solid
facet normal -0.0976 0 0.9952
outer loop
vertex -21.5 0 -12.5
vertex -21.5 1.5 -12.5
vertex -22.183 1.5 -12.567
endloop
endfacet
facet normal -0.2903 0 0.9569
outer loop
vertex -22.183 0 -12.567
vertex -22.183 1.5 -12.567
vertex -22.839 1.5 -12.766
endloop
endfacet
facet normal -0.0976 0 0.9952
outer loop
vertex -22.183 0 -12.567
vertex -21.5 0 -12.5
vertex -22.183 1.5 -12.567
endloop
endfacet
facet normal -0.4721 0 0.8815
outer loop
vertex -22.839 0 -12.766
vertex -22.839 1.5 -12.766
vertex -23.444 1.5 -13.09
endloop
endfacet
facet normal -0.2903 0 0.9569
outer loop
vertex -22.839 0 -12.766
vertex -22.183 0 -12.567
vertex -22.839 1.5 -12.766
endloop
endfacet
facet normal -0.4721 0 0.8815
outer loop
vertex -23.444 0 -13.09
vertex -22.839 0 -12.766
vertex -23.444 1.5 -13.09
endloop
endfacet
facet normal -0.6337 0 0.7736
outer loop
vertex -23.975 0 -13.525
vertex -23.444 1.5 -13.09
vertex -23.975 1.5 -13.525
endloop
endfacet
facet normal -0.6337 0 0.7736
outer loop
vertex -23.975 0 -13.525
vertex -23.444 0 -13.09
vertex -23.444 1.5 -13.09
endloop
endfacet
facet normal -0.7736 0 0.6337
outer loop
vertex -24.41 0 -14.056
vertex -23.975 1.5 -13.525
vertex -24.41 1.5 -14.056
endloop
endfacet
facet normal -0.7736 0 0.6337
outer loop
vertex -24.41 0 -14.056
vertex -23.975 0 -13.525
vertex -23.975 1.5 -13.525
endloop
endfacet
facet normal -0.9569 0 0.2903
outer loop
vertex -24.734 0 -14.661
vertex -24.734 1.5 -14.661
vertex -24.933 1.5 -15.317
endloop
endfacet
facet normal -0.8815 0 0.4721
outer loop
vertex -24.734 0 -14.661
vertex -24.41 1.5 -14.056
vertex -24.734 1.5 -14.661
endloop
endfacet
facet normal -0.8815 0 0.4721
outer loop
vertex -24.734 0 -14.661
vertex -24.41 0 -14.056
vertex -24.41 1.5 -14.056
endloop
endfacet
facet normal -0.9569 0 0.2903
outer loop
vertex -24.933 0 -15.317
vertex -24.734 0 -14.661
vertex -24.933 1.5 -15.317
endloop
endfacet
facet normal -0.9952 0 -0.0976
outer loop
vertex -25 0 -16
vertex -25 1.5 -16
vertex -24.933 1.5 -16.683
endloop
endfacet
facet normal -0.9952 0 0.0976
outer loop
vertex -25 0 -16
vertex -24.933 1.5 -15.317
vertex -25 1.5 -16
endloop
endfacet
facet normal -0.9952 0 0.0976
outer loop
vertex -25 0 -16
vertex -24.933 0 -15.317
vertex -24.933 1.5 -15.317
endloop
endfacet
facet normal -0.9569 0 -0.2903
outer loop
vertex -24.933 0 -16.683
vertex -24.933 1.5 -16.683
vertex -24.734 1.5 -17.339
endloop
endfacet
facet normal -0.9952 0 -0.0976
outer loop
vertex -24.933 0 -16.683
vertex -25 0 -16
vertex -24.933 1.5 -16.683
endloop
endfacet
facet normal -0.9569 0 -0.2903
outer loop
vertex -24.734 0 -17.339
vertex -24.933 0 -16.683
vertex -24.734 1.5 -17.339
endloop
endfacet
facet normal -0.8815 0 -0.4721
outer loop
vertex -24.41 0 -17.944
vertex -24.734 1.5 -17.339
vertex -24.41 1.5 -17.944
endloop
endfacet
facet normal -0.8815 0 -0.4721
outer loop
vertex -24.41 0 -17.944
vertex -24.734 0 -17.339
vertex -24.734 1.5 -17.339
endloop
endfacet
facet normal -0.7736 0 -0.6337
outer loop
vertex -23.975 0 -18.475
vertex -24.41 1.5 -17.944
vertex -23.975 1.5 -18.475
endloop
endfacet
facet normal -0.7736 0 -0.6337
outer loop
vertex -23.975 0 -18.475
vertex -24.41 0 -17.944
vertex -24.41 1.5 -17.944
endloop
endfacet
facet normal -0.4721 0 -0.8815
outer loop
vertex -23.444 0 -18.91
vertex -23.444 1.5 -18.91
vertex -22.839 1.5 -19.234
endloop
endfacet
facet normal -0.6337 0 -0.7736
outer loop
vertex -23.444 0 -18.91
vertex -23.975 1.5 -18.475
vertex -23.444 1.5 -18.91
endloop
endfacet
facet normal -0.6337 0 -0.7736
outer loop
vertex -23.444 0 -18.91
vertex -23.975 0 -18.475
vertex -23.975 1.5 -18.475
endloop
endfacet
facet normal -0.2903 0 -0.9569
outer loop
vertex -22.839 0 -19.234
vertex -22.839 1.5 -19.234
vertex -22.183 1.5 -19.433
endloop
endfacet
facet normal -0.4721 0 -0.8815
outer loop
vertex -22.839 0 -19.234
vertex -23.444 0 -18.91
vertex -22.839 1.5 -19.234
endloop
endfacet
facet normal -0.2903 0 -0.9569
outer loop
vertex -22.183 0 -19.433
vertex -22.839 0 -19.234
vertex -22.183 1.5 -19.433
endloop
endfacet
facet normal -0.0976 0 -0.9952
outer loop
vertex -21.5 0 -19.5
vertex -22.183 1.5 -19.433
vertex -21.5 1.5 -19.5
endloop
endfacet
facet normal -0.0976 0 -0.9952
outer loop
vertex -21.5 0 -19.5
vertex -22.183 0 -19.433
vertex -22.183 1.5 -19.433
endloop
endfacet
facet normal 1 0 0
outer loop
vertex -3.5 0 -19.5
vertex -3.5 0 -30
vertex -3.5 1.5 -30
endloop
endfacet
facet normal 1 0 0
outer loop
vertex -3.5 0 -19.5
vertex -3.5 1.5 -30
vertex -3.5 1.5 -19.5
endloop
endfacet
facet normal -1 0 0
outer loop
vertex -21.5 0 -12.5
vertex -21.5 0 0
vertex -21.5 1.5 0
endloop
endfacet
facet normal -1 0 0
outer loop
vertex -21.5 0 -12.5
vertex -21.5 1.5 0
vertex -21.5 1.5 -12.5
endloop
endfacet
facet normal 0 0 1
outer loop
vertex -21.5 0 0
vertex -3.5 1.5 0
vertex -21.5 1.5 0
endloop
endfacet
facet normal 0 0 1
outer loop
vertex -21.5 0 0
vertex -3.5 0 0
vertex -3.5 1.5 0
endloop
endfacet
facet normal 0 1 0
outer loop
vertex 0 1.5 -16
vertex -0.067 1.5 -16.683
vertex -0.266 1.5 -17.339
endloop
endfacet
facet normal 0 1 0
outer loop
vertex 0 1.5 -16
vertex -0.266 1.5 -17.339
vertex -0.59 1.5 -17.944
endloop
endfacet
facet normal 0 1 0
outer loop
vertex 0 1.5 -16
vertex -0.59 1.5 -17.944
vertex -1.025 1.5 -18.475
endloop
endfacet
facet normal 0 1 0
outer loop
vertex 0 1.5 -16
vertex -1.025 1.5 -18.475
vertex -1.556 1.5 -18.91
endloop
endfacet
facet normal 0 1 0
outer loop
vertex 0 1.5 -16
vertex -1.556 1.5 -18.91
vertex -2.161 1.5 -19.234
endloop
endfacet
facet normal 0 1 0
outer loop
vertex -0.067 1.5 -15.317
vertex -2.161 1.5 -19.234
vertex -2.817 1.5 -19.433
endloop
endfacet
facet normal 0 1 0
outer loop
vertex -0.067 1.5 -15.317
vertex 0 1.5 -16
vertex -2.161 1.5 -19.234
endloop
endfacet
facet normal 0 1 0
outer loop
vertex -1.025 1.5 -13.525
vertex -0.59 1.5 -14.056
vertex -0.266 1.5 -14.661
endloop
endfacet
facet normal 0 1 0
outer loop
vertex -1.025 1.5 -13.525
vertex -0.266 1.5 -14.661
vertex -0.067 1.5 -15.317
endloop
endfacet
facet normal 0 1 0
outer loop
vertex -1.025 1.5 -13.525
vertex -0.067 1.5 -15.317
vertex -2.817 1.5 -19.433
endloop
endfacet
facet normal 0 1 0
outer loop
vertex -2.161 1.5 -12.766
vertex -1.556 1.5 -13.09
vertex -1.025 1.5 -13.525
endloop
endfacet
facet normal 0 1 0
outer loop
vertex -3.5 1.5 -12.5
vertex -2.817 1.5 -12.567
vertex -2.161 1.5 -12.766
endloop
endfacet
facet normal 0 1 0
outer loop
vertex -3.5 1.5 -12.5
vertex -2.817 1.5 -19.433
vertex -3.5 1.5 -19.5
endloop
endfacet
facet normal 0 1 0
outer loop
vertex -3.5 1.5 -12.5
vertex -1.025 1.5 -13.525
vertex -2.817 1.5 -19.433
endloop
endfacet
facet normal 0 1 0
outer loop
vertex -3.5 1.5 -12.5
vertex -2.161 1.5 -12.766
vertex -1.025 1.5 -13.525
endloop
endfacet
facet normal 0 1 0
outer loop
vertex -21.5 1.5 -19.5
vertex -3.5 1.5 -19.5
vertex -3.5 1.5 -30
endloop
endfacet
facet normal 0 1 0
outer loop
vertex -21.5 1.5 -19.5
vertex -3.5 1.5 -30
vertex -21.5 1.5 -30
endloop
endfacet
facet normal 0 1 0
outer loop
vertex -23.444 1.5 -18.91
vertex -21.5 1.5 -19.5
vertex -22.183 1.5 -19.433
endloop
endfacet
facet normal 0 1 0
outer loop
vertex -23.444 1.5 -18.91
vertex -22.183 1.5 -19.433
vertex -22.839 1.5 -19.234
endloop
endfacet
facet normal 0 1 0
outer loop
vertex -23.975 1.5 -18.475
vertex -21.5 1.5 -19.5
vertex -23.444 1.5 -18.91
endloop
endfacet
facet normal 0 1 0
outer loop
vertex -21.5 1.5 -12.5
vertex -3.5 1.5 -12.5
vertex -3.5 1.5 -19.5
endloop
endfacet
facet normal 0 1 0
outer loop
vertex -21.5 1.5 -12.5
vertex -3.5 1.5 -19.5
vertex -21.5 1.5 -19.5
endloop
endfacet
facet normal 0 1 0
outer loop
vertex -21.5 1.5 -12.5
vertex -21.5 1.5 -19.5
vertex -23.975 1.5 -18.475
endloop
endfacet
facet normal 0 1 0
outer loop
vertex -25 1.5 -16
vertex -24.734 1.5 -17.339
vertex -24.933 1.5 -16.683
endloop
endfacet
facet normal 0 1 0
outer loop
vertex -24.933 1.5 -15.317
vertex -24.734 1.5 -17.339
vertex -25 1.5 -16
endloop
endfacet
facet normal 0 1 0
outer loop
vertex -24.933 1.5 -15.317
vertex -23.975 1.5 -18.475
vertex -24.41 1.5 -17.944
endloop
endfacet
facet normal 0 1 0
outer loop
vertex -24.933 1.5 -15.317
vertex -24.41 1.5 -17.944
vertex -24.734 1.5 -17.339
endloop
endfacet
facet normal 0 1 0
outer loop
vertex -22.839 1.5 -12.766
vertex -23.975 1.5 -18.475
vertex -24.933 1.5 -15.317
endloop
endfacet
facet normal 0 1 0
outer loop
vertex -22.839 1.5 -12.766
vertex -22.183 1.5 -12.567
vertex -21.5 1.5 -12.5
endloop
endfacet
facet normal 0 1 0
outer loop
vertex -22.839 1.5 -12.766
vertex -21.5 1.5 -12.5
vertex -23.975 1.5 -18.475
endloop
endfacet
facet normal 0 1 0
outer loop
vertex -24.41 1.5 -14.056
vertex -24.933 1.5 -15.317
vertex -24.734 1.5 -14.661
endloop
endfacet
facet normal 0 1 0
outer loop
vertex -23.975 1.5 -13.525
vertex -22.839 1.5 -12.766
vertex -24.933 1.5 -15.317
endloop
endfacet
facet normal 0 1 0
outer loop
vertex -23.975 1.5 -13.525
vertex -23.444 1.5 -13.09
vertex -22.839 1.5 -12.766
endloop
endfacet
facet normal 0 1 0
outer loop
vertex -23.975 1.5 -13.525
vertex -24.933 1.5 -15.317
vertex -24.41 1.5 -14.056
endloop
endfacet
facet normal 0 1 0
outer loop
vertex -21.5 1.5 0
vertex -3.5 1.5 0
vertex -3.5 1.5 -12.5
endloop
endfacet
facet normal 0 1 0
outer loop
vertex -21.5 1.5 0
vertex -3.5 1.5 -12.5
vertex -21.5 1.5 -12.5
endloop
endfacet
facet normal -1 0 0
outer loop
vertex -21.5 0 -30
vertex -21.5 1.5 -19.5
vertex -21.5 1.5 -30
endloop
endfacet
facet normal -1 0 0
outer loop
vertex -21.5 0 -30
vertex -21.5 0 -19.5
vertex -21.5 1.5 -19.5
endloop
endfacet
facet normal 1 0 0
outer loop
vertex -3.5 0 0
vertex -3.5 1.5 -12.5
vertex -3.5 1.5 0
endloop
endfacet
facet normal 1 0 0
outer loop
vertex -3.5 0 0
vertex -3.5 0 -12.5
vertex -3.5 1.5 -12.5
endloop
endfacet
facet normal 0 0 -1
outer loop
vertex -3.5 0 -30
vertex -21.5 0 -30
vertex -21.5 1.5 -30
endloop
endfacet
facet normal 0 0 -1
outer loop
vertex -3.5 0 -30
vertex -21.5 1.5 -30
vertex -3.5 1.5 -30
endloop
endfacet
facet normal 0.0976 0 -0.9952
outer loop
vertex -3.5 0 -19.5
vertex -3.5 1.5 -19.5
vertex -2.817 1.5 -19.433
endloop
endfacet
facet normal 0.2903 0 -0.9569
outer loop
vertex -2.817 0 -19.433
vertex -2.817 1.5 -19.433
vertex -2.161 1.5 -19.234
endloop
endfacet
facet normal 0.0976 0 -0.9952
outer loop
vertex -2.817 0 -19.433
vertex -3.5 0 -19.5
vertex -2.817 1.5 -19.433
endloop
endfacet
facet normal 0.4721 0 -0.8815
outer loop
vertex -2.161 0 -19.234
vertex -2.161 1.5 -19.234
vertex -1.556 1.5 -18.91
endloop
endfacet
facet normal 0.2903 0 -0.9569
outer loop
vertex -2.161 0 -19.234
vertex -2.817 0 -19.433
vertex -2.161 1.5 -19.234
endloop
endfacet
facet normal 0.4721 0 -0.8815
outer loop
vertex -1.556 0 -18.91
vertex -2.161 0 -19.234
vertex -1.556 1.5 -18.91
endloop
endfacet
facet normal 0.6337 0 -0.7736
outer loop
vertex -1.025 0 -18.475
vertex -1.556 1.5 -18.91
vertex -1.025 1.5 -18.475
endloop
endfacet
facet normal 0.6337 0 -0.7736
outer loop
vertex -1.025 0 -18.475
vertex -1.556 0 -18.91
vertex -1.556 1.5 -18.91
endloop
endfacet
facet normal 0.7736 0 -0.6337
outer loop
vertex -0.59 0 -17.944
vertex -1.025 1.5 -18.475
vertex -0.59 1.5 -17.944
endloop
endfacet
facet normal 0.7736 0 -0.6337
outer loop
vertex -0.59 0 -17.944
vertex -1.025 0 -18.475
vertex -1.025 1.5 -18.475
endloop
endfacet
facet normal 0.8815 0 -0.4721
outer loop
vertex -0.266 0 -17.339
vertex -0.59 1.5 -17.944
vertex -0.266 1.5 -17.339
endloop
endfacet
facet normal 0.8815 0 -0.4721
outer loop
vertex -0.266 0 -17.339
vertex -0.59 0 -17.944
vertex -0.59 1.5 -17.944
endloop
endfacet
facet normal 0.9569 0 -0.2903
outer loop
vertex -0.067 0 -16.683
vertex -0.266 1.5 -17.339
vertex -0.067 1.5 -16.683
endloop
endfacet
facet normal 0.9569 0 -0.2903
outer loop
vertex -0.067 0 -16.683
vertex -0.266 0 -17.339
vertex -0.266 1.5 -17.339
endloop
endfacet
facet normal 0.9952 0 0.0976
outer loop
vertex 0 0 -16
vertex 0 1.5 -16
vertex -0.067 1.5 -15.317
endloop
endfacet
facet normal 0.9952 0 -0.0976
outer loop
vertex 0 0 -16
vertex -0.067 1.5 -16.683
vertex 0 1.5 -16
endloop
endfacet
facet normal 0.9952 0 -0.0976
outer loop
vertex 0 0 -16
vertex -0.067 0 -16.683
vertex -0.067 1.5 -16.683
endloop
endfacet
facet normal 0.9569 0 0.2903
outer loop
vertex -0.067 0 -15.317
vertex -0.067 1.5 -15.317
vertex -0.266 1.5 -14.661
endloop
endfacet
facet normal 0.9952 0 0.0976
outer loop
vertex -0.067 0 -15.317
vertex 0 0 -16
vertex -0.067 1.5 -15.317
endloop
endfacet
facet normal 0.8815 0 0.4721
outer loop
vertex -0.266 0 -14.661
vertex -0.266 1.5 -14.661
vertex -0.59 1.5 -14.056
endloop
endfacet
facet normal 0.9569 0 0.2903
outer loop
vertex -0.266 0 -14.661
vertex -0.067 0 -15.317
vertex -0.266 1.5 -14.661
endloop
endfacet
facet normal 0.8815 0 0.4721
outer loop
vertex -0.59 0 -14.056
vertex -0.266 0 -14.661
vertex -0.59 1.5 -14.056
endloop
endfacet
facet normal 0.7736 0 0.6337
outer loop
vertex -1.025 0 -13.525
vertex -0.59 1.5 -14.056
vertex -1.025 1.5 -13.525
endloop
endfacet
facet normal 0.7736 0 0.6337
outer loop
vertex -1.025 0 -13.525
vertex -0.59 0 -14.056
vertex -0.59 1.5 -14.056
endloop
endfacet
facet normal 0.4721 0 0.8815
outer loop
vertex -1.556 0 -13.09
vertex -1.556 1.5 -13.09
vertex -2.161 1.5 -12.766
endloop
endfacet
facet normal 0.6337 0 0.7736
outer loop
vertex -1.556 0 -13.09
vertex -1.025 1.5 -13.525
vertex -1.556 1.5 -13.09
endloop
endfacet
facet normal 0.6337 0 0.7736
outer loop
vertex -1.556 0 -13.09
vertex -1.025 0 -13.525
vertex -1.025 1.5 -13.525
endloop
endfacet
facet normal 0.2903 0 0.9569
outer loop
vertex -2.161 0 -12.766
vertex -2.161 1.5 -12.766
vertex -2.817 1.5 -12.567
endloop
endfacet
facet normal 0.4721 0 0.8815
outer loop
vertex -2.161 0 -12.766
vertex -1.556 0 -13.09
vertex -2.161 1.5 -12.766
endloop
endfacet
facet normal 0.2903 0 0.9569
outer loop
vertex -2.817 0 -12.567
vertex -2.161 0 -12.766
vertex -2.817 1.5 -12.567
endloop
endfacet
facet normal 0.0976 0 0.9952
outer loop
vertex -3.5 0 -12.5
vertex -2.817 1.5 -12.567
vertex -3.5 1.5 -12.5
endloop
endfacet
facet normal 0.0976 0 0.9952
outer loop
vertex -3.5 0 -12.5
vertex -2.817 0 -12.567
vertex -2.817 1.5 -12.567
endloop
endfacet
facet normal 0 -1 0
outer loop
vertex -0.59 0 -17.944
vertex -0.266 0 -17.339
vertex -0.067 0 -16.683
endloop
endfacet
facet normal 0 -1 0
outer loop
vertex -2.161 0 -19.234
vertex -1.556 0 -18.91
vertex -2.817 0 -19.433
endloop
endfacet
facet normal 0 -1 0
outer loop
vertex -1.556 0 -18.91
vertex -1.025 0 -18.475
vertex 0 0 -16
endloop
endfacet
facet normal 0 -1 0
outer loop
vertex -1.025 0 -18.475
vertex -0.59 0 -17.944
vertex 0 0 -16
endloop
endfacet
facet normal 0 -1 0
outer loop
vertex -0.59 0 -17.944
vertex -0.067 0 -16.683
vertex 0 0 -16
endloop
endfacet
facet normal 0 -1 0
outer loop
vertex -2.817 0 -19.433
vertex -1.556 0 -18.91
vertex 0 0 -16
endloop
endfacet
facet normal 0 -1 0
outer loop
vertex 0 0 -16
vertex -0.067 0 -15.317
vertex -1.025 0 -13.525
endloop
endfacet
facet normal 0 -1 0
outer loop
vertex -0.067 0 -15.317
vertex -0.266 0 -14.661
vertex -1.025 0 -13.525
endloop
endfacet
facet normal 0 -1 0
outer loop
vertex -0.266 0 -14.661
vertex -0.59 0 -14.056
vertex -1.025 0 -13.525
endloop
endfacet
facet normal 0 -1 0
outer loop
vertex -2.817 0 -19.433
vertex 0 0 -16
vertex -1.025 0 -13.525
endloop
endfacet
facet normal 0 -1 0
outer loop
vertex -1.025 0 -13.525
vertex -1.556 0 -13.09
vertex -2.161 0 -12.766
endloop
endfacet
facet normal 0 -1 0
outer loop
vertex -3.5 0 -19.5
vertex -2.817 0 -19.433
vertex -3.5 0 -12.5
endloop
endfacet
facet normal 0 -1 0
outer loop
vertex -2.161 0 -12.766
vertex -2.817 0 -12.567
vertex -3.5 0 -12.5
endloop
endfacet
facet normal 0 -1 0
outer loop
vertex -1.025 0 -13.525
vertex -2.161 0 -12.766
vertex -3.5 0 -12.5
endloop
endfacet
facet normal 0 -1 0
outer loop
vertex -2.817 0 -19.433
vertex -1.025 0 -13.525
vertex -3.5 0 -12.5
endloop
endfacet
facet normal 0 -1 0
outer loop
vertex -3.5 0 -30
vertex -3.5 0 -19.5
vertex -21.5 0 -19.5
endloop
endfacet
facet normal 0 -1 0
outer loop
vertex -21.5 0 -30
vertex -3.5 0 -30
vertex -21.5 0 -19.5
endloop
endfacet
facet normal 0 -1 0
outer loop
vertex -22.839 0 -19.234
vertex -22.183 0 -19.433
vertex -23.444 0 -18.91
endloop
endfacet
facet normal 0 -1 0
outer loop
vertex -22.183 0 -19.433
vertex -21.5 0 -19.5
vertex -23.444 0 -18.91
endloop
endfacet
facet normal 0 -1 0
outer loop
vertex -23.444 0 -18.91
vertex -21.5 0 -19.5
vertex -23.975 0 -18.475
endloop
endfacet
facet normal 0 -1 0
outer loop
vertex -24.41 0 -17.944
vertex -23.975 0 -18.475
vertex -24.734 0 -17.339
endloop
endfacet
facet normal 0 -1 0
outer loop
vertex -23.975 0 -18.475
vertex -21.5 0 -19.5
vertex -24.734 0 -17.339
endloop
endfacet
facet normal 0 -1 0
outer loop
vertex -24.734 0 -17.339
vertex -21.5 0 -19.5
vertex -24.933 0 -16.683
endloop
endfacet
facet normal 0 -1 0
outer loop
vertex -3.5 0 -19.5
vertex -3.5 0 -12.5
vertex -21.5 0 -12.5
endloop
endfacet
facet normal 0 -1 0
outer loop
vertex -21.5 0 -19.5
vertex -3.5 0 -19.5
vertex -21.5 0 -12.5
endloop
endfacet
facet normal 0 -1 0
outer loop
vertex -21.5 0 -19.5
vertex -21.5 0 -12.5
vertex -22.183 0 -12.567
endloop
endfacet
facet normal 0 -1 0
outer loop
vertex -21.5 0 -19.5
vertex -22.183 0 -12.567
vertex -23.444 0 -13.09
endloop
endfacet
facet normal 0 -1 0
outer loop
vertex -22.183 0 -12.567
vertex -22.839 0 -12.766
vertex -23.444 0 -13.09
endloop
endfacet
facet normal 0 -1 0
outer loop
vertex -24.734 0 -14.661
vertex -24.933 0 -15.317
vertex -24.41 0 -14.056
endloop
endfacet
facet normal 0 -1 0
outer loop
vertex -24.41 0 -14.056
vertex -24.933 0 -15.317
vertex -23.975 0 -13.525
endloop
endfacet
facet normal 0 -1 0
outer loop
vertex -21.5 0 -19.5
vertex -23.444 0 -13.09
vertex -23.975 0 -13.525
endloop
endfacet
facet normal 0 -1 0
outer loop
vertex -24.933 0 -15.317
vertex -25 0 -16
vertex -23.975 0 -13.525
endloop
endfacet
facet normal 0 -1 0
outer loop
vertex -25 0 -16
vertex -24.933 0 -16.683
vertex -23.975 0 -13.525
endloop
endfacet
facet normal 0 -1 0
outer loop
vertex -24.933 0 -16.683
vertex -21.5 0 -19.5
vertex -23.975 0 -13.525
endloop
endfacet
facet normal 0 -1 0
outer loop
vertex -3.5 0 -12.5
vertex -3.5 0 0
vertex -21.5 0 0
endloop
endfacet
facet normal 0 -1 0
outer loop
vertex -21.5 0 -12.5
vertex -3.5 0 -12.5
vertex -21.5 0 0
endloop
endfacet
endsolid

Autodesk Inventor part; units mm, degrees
ref_plane "YZ Plane" through (0, 0, 0) normal (1, 0, 0) x (0, 1, 0)
ref_plane "XZ Plane" through (0, 0, 0) normal (0, 1, 0) x (-1, 0, 0)
ref_plane "XY Plane" through (0, 0, 0) normal (0, 0, 1) x (1, 0, 0)
sketch "スケッチ1" plane through (0, 0, 0) normal (0, 1, 0) x (-1, 0, 0)
  line L0 (0, 0) -> (25, 0)
  line L1 (25, 0) -> (25, -30)
  line L2 (25, -30) -> (0, -30)
  line L3 (0, -30) -> (0, 0)
  circle A0 centre (21.5, -16) radius 3.5
  circle A1 centre (3.5, -16) radius 3.5
  line L4 (21.5, 0) -> (21.5, -30)
  line L5 (3.5, -30) -> (3.5, 0)
  point P0 (21.5, -19.5)
  point P1 (21.5, -12.5)
  point P2 (3.5, -12.5)
  point P3 (3.5, -19.5)
  dimension "d0" = 25
  dimension "d1" = 30
  dimension "d2" = 7
  dimension "d3" = 16
extrude "押し出し1" add sketch "スケッチ1" along normal blind 1.5 contours L0 L4 A0 L2 L5 A1 | A1 L5 | A1 L5 | L4 A0 | A0 L4
properties part number "type_C"
